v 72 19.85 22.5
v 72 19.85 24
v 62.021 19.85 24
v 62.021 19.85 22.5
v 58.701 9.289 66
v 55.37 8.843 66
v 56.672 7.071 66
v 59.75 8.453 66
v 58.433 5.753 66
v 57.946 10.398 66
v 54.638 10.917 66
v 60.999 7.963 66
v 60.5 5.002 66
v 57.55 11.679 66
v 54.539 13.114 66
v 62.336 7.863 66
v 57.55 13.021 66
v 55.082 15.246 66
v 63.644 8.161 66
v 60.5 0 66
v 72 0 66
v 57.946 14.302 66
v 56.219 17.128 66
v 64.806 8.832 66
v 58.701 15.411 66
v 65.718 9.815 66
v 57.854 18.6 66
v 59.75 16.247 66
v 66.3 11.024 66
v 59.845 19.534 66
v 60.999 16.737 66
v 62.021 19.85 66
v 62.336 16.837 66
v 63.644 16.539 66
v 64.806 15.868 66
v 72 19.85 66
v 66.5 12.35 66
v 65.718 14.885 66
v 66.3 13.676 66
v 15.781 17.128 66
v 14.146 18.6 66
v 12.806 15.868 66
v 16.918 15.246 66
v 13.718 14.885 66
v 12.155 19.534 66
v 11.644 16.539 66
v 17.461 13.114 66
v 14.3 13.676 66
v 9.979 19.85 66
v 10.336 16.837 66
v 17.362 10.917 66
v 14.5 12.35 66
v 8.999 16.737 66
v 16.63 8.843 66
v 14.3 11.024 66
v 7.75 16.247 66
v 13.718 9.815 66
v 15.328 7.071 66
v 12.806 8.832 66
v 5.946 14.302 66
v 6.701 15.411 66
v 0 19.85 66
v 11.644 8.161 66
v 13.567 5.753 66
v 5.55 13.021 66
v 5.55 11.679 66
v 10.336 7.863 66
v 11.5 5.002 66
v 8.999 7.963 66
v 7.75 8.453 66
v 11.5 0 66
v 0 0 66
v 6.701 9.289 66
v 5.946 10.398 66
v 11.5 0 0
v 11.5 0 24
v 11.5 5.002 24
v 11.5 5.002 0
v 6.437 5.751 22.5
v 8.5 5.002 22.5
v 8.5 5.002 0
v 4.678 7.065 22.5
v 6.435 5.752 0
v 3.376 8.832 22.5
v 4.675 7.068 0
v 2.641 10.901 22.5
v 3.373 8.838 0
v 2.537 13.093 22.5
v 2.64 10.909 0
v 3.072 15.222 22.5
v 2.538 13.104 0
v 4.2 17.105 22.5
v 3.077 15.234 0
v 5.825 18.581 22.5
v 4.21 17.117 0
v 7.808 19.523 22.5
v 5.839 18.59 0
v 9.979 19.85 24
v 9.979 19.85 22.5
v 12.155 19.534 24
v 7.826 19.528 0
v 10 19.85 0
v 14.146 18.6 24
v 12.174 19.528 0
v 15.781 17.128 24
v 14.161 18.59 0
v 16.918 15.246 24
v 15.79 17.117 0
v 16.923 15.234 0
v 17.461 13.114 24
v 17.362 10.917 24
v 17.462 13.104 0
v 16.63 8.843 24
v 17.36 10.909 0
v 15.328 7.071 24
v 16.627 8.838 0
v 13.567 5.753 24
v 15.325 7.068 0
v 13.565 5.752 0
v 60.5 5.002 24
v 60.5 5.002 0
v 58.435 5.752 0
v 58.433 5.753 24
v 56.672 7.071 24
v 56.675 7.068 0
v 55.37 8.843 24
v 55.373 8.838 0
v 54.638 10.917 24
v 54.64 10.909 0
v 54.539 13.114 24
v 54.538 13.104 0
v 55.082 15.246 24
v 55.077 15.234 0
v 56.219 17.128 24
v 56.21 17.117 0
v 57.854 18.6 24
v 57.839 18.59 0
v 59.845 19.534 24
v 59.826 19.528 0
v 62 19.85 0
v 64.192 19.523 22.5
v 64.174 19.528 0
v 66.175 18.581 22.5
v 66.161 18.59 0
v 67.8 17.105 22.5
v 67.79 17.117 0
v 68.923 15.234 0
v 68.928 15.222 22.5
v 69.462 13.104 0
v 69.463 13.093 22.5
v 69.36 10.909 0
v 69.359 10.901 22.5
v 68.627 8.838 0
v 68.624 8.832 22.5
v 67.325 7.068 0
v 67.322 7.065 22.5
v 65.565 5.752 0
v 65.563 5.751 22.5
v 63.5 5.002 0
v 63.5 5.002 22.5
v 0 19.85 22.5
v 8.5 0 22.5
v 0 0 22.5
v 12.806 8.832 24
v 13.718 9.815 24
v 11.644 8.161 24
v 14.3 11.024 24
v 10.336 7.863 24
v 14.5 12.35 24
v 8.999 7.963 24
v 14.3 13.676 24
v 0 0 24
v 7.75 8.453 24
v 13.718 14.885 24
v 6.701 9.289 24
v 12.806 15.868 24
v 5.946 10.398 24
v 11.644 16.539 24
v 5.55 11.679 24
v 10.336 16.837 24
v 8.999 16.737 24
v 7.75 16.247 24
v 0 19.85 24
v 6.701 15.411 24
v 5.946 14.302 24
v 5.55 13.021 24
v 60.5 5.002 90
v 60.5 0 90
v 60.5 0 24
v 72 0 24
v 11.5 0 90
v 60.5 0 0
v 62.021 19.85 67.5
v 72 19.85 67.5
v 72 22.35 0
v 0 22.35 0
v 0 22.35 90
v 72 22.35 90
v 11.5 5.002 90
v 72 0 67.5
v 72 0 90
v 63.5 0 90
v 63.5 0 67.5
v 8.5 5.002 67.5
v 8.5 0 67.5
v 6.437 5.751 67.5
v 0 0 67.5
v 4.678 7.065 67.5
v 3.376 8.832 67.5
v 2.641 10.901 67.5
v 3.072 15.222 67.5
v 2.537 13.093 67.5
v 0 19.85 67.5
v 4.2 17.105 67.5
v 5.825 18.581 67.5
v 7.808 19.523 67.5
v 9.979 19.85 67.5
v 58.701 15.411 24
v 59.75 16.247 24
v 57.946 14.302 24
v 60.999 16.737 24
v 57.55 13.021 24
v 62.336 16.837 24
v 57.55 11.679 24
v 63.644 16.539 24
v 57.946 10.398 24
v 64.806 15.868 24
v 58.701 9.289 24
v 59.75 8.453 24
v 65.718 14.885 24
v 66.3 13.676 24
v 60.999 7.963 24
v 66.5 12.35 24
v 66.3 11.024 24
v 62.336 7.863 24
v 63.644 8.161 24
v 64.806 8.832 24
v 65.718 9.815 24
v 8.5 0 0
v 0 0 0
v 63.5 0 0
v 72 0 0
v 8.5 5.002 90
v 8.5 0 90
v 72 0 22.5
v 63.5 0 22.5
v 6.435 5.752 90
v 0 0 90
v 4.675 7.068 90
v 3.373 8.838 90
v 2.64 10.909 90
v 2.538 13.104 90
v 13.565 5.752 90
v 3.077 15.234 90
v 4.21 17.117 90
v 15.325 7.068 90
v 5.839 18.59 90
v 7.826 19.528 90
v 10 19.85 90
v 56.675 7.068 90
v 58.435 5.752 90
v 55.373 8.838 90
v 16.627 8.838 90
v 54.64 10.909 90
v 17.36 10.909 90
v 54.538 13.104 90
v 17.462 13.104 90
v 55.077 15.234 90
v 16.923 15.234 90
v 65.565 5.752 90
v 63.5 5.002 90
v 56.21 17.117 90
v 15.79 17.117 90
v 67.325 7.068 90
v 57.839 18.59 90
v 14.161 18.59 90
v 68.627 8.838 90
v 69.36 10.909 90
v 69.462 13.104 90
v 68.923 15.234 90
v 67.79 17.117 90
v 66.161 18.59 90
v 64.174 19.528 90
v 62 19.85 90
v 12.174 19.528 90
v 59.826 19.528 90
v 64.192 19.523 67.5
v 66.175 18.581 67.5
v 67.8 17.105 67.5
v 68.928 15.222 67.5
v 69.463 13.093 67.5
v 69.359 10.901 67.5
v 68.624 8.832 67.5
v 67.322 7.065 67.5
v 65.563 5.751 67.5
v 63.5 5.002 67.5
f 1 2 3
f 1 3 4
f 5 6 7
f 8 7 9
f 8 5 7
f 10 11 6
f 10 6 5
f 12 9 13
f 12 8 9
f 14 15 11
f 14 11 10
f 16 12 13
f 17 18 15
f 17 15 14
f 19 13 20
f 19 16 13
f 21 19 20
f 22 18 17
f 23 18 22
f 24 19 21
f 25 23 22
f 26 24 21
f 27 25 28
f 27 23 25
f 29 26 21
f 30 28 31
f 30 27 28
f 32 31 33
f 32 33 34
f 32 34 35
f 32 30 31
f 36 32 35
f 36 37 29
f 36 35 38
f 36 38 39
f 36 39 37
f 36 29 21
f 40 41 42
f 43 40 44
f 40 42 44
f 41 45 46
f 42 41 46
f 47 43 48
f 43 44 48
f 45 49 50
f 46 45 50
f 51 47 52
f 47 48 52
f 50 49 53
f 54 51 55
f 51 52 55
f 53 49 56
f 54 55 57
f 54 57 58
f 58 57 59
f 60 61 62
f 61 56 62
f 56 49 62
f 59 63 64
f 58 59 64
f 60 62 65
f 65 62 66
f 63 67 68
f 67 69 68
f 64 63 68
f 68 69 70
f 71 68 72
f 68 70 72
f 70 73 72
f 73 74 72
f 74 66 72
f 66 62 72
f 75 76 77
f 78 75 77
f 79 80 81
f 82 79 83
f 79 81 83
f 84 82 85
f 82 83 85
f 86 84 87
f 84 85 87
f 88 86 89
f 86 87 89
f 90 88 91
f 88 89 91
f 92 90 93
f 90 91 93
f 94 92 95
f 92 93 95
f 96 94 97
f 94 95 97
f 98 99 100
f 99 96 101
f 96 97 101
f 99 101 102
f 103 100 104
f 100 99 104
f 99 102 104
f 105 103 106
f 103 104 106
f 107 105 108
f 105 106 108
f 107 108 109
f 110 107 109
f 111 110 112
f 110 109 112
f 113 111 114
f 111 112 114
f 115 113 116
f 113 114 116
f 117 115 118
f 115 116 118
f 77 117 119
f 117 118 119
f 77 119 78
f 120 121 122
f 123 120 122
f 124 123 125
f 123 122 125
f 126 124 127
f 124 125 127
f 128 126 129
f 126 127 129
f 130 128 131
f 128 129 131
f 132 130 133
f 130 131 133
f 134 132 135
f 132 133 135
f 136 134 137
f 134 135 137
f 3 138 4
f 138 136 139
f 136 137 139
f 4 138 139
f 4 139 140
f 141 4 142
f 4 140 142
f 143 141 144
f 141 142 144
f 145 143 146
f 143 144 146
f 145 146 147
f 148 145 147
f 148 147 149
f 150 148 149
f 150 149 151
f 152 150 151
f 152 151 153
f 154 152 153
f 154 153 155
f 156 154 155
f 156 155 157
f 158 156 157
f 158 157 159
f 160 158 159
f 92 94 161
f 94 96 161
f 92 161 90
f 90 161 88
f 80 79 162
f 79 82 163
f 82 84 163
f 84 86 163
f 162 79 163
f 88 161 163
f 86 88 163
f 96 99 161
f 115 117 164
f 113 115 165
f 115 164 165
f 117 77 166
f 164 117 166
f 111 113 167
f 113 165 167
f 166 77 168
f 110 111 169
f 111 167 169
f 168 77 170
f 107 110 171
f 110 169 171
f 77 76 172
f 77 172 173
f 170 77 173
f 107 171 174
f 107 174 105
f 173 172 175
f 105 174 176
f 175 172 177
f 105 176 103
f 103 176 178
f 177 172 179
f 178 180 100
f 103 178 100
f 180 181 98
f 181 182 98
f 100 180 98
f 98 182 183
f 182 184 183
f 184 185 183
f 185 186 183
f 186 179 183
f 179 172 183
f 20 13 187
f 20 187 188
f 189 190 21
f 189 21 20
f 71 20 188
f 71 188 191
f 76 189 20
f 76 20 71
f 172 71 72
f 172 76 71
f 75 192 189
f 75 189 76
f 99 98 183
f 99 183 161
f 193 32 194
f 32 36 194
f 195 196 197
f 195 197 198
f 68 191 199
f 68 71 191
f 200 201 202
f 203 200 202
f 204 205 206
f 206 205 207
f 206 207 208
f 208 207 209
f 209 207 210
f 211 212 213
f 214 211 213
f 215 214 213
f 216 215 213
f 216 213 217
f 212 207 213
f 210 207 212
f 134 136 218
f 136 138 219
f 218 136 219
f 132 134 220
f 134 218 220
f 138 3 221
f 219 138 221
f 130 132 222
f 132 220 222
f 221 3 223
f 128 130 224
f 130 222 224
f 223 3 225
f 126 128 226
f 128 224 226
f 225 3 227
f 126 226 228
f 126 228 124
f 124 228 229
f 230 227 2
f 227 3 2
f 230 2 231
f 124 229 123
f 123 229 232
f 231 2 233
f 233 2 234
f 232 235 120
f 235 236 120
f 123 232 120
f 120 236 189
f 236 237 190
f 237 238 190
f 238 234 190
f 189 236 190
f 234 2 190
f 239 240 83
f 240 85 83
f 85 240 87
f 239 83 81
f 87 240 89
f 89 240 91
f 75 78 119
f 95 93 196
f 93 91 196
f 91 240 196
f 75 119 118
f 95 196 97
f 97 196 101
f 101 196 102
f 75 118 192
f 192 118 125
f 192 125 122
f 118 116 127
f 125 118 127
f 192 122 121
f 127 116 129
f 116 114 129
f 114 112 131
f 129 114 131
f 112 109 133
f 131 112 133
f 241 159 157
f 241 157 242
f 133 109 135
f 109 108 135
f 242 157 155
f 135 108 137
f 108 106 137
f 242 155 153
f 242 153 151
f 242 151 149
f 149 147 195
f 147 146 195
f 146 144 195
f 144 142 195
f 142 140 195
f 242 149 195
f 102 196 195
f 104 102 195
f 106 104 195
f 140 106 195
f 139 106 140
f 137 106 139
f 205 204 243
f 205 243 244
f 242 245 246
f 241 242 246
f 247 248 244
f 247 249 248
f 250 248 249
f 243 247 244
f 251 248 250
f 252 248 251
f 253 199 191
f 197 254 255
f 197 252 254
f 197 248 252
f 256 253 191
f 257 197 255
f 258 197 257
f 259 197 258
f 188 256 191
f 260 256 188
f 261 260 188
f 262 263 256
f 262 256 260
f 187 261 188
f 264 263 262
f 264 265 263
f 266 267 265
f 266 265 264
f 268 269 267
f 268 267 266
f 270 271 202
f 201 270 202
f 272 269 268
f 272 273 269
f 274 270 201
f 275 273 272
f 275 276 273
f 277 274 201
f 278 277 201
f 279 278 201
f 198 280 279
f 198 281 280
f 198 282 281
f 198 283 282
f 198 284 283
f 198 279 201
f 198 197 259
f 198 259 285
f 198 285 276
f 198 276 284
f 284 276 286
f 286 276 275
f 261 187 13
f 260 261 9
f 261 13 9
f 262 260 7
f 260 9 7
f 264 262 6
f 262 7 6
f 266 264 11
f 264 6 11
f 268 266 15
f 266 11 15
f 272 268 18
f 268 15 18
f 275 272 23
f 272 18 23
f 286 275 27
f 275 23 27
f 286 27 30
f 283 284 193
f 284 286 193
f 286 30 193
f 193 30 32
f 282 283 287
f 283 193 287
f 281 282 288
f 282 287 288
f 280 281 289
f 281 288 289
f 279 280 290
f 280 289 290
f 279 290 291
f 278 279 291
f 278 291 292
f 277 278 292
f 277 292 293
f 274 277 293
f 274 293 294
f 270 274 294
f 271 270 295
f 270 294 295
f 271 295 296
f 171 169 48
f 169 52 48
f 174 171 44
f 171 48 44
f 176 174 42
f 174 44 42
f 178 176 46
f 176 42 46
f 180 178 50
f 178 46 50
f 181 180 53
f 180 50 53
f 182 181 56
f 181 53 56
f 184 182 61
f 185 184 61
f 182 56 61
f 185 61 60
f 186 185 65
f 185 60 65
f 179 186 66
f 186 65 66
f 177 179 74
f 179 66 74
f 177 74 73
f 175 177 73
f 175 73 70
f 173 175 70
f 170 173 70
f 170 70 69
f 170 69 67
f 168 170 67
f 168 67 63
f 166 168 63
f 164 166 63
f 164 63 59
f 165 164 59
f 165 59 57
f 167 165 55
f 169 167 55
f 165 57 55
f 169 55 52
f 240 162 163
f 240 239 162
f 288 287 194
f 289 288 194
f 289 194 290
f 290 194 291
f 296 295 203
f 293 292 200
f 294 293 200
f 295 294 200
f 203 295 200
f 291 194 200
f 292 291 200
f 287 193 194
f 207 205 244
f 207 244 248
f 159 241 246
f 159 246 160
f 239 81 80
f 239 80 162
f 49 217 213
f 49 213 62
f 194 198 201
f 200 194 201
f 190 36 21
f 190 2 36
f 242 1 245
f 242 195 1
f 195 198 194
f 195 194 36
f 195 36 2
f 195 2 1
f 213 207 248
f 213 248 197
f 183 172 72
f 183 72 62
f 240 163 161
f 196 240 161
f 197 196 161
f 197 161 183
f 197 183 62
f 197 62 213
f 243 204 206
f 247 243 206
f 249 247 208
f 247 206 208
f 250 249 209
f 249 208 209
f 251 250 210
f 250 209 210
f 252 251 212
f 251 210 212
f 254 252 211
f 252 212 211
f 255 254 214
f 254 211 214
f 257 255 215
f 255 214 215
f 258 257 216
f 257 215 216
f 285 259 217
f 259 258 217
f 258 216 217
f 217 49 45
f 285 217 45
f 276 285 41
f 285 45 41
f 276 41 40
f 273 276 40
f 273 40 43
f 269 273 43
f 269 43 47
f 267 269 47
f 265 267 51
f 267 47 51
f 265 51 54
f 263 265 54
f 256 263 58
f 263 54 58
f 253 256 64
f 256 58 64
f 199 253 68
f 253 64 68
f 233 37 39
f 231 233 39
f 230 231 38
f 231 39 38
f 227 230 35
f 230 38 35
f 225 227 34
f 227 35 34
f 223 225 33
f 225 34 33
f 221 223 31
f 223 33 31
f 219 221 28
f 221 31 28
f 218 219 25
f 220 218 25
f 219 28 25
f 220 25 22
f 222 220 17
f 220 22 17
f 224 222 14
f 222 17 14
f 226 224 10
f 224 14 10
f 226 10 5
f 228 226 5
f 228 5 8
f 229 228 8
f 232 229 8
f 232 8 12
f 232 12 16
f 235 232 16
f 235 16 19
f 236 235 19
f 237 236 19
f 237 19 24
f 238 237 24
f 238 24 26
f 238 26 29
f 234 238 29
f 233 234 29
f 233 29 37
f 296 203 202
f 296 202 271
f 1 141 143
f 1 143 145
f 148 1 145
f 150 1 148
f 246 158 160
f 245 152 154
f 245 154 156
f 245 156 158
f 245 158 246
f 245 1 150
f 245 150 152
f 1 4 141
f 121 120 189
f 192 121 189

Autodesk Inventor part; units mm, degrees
ref_plane "YZ Plane" through (0, 0, 0) normal (1, 0, 0) x (0, 1, 0)
sketch "Sketch1" plane through (0, 0, 0) normal (0, 0, 1) x (1, 0, 0)
  line L0 (0, 0) -> (0, 22.35)
  line L1 (0, 22.35) -> (72, 22.35)
  line L2 (72, 22.35) -> (72, 0)
  arc A0 (11.5, 5.0015) -> (8.5, 5.0015) centre (10, 12.35) ccw
  arc A1 (63.5, 5.0015) -> (60.5, 5.0015) centre (62, 12.35) ccw
  line L3 (72, 0) -> (63.5, 0)
  line L4 (63.5, 0) -> (63.5, 5.0015)
  line L5 (60.5, 5.0015) -> (60.5, 0)
  line L6 (60.5, 0) -> (11.5, 0)
  line L7 (11.5, 0) -> (11.5, 5.0015)
  line L8 (8.5, 5.0015) -> (8.5, 0)
  line L9 (8.5, 0) -> (0, 0)
  dimension "d0" = 22.35
  dimension "d1" = 72
  dimension "d2" = 15
  dimension "d4" = 10
  dimension "d5" = 10
  dimension "d6" = 10
  dimension "d7" = 3
  dimension "d8" = 3
extrude "Extrusion1" add sketch "Sketch1" along normal blind 90
ref_plane "Work Plane1" through (0, 0, 66) normal (0, 0, 1) x (1, 0, 0)
sketch "Sketch2" plane through (0, 0, 66) normal (0, 0, 1) x (1, 0, 0)
  line L0 (0, 22.35) -> (0, 0) projected
  line L1 (0, 0) -> (8.5, 0) projected
  line L2 (8.5, 0) -> (8.5, 5.0015) projected
  arc A0 (11.5, 5.0015) -> (8.5, 5.0015) centre (10, 12.35) ccw projected
  line L3 (11.5, 5.0015) -> (11.5, 0) projected
  line L4 (11.5, 0) -> (60.5, 0) projected
  line L5 (60.5, 0) -> (60.5, 5.0015) projected
  arc A1 (63.5, 5.0015) -> (60.5, 5.0015) centre (62, 12.35) ccw projected
  line L6 (63.5, 5.0015) -> (63.5, 0) projected
  line L7 (63.5, 0) -> (72, 0) projected
  line L8 (72, 0) -> (72, 22.35) projected
  line L9 (72, 22.35) -> (0, 22.35) projected
  line L10 (8.5, 0) -> (11.5, 0)
  line L11 (11.5, 0) -> (60.5, 0)
  line L12 (60.5, 0) -> (63.5, 0)
ref_plane "Work Plane2" through (0, 0, 24) normal (0, 0, -1) x (-1, 0, 0)
extrude "Extrusion2" add sketch "Sketch2" against normal up to surface (42 mm away) contours L2 A0 L3 L10 | L12 L5 A1 L6
sketch "Sketch3" plane through (0, 0, 66) normal (0, 0, 1) x (1, 0, 0)
  arc A0 (11.5, 5.0015) -> (8.5, 5.0015) centre (10, 12.35) ccw projected
  line L0 (60.5, 0) -> (63.5, 0) projected
  line L1 (63.5, 5.0015) -> (63.5, 0) projected
  arc A1 (63.5, 5.0015) -> (60.5, 5.0015) centre (62, 12.35) ccw projected
  line L2 (60.5, 0) -> (60.5, 5.0015) projected
  circle A2 centre (10, 12.35) radius 4.5
  circle A3 centre (62, 12.35) radius 4.5
  point P0 (0, 0)
  dimension "d15" = 9
  dimension "d16" = 9
extrude "Extrusion3" cut sketch "Sketch3" against normal up to surface (42 mm away) contours A2 | A3
sketch "Sketch4" plane through (72, 0, 0) normal (1, 0, 0) x (0, 0, -1)
  line L0 (0, 22.35) -> (0, 0) projected
  line L1 (0, 22.35) -> (-90, 22.35) projected
  line L2 (-90, 0) -> (-90, 22.35) projected
  line L3 (0, 0) -> (-90, 0) projected
  line L4 (-66, 5.0015) -> (-66, 19.85) projected
  line L5 (-24, 19.85) -> (-24, 5.0015) projected
  line L6 (-66, 19.85) -> (-67.5, 19.85)
  line L7 (-90, 19.85) -> (-66, 19.85) projected
  line L8 (-67.5, 19.85) -> (-67.5, 0)
  line L9 (0, 0) -> (-90, 0) projected
  line L10 (-66, 5.0015) -> (-66, 0)
  line L11 (-66, 0) -> (-66, 5.0015) projected
  line L12 (-24, 19.85) -> (-22.5, 19.85)
  line L13 (-24, 19.85) -> (0, 19.85) projected
  line L14 (-22.5, 19.85) -> (-22.5, 0)
  line L15 (-24, 5.0015) -> (-24, 0)
  line L16 (-24, 5.0015) -> (-24, 0) projected
  dimension "d19" = 1.5
  dimension "d20" = 1.5
extrude "Extrusion4" cut sketch "Sketch4" against normal blind 10 contours L14 L3 L15 L5 L12 | L6 L4 L10 L3 L8
sketch "Sketch5" plane through (0, 0, 0) normal (-1, 0, 0) x (0, 0, 1)
  line L0 (0, 0) -> (90, 0) projected
  line L1 (67.5, 0) -> (67.5, 19.85) projected
  line L2 (67.5, 19.85) -> (66, 19.85) projected
  line L3 (66, 19.85) -> (66, 0) projected
  line L4 (24, 0) -> (24, 19.85) projected
  line L5 (24, 19.85) -> (22.5, 19.85) projected
  line L6 (22.5, 19.85) -> (22.5, 0) projected
extrude "Extrusion5" cut sketch "Sketch5" against normal blind 10
properties part number "XCarriageHexagon"
